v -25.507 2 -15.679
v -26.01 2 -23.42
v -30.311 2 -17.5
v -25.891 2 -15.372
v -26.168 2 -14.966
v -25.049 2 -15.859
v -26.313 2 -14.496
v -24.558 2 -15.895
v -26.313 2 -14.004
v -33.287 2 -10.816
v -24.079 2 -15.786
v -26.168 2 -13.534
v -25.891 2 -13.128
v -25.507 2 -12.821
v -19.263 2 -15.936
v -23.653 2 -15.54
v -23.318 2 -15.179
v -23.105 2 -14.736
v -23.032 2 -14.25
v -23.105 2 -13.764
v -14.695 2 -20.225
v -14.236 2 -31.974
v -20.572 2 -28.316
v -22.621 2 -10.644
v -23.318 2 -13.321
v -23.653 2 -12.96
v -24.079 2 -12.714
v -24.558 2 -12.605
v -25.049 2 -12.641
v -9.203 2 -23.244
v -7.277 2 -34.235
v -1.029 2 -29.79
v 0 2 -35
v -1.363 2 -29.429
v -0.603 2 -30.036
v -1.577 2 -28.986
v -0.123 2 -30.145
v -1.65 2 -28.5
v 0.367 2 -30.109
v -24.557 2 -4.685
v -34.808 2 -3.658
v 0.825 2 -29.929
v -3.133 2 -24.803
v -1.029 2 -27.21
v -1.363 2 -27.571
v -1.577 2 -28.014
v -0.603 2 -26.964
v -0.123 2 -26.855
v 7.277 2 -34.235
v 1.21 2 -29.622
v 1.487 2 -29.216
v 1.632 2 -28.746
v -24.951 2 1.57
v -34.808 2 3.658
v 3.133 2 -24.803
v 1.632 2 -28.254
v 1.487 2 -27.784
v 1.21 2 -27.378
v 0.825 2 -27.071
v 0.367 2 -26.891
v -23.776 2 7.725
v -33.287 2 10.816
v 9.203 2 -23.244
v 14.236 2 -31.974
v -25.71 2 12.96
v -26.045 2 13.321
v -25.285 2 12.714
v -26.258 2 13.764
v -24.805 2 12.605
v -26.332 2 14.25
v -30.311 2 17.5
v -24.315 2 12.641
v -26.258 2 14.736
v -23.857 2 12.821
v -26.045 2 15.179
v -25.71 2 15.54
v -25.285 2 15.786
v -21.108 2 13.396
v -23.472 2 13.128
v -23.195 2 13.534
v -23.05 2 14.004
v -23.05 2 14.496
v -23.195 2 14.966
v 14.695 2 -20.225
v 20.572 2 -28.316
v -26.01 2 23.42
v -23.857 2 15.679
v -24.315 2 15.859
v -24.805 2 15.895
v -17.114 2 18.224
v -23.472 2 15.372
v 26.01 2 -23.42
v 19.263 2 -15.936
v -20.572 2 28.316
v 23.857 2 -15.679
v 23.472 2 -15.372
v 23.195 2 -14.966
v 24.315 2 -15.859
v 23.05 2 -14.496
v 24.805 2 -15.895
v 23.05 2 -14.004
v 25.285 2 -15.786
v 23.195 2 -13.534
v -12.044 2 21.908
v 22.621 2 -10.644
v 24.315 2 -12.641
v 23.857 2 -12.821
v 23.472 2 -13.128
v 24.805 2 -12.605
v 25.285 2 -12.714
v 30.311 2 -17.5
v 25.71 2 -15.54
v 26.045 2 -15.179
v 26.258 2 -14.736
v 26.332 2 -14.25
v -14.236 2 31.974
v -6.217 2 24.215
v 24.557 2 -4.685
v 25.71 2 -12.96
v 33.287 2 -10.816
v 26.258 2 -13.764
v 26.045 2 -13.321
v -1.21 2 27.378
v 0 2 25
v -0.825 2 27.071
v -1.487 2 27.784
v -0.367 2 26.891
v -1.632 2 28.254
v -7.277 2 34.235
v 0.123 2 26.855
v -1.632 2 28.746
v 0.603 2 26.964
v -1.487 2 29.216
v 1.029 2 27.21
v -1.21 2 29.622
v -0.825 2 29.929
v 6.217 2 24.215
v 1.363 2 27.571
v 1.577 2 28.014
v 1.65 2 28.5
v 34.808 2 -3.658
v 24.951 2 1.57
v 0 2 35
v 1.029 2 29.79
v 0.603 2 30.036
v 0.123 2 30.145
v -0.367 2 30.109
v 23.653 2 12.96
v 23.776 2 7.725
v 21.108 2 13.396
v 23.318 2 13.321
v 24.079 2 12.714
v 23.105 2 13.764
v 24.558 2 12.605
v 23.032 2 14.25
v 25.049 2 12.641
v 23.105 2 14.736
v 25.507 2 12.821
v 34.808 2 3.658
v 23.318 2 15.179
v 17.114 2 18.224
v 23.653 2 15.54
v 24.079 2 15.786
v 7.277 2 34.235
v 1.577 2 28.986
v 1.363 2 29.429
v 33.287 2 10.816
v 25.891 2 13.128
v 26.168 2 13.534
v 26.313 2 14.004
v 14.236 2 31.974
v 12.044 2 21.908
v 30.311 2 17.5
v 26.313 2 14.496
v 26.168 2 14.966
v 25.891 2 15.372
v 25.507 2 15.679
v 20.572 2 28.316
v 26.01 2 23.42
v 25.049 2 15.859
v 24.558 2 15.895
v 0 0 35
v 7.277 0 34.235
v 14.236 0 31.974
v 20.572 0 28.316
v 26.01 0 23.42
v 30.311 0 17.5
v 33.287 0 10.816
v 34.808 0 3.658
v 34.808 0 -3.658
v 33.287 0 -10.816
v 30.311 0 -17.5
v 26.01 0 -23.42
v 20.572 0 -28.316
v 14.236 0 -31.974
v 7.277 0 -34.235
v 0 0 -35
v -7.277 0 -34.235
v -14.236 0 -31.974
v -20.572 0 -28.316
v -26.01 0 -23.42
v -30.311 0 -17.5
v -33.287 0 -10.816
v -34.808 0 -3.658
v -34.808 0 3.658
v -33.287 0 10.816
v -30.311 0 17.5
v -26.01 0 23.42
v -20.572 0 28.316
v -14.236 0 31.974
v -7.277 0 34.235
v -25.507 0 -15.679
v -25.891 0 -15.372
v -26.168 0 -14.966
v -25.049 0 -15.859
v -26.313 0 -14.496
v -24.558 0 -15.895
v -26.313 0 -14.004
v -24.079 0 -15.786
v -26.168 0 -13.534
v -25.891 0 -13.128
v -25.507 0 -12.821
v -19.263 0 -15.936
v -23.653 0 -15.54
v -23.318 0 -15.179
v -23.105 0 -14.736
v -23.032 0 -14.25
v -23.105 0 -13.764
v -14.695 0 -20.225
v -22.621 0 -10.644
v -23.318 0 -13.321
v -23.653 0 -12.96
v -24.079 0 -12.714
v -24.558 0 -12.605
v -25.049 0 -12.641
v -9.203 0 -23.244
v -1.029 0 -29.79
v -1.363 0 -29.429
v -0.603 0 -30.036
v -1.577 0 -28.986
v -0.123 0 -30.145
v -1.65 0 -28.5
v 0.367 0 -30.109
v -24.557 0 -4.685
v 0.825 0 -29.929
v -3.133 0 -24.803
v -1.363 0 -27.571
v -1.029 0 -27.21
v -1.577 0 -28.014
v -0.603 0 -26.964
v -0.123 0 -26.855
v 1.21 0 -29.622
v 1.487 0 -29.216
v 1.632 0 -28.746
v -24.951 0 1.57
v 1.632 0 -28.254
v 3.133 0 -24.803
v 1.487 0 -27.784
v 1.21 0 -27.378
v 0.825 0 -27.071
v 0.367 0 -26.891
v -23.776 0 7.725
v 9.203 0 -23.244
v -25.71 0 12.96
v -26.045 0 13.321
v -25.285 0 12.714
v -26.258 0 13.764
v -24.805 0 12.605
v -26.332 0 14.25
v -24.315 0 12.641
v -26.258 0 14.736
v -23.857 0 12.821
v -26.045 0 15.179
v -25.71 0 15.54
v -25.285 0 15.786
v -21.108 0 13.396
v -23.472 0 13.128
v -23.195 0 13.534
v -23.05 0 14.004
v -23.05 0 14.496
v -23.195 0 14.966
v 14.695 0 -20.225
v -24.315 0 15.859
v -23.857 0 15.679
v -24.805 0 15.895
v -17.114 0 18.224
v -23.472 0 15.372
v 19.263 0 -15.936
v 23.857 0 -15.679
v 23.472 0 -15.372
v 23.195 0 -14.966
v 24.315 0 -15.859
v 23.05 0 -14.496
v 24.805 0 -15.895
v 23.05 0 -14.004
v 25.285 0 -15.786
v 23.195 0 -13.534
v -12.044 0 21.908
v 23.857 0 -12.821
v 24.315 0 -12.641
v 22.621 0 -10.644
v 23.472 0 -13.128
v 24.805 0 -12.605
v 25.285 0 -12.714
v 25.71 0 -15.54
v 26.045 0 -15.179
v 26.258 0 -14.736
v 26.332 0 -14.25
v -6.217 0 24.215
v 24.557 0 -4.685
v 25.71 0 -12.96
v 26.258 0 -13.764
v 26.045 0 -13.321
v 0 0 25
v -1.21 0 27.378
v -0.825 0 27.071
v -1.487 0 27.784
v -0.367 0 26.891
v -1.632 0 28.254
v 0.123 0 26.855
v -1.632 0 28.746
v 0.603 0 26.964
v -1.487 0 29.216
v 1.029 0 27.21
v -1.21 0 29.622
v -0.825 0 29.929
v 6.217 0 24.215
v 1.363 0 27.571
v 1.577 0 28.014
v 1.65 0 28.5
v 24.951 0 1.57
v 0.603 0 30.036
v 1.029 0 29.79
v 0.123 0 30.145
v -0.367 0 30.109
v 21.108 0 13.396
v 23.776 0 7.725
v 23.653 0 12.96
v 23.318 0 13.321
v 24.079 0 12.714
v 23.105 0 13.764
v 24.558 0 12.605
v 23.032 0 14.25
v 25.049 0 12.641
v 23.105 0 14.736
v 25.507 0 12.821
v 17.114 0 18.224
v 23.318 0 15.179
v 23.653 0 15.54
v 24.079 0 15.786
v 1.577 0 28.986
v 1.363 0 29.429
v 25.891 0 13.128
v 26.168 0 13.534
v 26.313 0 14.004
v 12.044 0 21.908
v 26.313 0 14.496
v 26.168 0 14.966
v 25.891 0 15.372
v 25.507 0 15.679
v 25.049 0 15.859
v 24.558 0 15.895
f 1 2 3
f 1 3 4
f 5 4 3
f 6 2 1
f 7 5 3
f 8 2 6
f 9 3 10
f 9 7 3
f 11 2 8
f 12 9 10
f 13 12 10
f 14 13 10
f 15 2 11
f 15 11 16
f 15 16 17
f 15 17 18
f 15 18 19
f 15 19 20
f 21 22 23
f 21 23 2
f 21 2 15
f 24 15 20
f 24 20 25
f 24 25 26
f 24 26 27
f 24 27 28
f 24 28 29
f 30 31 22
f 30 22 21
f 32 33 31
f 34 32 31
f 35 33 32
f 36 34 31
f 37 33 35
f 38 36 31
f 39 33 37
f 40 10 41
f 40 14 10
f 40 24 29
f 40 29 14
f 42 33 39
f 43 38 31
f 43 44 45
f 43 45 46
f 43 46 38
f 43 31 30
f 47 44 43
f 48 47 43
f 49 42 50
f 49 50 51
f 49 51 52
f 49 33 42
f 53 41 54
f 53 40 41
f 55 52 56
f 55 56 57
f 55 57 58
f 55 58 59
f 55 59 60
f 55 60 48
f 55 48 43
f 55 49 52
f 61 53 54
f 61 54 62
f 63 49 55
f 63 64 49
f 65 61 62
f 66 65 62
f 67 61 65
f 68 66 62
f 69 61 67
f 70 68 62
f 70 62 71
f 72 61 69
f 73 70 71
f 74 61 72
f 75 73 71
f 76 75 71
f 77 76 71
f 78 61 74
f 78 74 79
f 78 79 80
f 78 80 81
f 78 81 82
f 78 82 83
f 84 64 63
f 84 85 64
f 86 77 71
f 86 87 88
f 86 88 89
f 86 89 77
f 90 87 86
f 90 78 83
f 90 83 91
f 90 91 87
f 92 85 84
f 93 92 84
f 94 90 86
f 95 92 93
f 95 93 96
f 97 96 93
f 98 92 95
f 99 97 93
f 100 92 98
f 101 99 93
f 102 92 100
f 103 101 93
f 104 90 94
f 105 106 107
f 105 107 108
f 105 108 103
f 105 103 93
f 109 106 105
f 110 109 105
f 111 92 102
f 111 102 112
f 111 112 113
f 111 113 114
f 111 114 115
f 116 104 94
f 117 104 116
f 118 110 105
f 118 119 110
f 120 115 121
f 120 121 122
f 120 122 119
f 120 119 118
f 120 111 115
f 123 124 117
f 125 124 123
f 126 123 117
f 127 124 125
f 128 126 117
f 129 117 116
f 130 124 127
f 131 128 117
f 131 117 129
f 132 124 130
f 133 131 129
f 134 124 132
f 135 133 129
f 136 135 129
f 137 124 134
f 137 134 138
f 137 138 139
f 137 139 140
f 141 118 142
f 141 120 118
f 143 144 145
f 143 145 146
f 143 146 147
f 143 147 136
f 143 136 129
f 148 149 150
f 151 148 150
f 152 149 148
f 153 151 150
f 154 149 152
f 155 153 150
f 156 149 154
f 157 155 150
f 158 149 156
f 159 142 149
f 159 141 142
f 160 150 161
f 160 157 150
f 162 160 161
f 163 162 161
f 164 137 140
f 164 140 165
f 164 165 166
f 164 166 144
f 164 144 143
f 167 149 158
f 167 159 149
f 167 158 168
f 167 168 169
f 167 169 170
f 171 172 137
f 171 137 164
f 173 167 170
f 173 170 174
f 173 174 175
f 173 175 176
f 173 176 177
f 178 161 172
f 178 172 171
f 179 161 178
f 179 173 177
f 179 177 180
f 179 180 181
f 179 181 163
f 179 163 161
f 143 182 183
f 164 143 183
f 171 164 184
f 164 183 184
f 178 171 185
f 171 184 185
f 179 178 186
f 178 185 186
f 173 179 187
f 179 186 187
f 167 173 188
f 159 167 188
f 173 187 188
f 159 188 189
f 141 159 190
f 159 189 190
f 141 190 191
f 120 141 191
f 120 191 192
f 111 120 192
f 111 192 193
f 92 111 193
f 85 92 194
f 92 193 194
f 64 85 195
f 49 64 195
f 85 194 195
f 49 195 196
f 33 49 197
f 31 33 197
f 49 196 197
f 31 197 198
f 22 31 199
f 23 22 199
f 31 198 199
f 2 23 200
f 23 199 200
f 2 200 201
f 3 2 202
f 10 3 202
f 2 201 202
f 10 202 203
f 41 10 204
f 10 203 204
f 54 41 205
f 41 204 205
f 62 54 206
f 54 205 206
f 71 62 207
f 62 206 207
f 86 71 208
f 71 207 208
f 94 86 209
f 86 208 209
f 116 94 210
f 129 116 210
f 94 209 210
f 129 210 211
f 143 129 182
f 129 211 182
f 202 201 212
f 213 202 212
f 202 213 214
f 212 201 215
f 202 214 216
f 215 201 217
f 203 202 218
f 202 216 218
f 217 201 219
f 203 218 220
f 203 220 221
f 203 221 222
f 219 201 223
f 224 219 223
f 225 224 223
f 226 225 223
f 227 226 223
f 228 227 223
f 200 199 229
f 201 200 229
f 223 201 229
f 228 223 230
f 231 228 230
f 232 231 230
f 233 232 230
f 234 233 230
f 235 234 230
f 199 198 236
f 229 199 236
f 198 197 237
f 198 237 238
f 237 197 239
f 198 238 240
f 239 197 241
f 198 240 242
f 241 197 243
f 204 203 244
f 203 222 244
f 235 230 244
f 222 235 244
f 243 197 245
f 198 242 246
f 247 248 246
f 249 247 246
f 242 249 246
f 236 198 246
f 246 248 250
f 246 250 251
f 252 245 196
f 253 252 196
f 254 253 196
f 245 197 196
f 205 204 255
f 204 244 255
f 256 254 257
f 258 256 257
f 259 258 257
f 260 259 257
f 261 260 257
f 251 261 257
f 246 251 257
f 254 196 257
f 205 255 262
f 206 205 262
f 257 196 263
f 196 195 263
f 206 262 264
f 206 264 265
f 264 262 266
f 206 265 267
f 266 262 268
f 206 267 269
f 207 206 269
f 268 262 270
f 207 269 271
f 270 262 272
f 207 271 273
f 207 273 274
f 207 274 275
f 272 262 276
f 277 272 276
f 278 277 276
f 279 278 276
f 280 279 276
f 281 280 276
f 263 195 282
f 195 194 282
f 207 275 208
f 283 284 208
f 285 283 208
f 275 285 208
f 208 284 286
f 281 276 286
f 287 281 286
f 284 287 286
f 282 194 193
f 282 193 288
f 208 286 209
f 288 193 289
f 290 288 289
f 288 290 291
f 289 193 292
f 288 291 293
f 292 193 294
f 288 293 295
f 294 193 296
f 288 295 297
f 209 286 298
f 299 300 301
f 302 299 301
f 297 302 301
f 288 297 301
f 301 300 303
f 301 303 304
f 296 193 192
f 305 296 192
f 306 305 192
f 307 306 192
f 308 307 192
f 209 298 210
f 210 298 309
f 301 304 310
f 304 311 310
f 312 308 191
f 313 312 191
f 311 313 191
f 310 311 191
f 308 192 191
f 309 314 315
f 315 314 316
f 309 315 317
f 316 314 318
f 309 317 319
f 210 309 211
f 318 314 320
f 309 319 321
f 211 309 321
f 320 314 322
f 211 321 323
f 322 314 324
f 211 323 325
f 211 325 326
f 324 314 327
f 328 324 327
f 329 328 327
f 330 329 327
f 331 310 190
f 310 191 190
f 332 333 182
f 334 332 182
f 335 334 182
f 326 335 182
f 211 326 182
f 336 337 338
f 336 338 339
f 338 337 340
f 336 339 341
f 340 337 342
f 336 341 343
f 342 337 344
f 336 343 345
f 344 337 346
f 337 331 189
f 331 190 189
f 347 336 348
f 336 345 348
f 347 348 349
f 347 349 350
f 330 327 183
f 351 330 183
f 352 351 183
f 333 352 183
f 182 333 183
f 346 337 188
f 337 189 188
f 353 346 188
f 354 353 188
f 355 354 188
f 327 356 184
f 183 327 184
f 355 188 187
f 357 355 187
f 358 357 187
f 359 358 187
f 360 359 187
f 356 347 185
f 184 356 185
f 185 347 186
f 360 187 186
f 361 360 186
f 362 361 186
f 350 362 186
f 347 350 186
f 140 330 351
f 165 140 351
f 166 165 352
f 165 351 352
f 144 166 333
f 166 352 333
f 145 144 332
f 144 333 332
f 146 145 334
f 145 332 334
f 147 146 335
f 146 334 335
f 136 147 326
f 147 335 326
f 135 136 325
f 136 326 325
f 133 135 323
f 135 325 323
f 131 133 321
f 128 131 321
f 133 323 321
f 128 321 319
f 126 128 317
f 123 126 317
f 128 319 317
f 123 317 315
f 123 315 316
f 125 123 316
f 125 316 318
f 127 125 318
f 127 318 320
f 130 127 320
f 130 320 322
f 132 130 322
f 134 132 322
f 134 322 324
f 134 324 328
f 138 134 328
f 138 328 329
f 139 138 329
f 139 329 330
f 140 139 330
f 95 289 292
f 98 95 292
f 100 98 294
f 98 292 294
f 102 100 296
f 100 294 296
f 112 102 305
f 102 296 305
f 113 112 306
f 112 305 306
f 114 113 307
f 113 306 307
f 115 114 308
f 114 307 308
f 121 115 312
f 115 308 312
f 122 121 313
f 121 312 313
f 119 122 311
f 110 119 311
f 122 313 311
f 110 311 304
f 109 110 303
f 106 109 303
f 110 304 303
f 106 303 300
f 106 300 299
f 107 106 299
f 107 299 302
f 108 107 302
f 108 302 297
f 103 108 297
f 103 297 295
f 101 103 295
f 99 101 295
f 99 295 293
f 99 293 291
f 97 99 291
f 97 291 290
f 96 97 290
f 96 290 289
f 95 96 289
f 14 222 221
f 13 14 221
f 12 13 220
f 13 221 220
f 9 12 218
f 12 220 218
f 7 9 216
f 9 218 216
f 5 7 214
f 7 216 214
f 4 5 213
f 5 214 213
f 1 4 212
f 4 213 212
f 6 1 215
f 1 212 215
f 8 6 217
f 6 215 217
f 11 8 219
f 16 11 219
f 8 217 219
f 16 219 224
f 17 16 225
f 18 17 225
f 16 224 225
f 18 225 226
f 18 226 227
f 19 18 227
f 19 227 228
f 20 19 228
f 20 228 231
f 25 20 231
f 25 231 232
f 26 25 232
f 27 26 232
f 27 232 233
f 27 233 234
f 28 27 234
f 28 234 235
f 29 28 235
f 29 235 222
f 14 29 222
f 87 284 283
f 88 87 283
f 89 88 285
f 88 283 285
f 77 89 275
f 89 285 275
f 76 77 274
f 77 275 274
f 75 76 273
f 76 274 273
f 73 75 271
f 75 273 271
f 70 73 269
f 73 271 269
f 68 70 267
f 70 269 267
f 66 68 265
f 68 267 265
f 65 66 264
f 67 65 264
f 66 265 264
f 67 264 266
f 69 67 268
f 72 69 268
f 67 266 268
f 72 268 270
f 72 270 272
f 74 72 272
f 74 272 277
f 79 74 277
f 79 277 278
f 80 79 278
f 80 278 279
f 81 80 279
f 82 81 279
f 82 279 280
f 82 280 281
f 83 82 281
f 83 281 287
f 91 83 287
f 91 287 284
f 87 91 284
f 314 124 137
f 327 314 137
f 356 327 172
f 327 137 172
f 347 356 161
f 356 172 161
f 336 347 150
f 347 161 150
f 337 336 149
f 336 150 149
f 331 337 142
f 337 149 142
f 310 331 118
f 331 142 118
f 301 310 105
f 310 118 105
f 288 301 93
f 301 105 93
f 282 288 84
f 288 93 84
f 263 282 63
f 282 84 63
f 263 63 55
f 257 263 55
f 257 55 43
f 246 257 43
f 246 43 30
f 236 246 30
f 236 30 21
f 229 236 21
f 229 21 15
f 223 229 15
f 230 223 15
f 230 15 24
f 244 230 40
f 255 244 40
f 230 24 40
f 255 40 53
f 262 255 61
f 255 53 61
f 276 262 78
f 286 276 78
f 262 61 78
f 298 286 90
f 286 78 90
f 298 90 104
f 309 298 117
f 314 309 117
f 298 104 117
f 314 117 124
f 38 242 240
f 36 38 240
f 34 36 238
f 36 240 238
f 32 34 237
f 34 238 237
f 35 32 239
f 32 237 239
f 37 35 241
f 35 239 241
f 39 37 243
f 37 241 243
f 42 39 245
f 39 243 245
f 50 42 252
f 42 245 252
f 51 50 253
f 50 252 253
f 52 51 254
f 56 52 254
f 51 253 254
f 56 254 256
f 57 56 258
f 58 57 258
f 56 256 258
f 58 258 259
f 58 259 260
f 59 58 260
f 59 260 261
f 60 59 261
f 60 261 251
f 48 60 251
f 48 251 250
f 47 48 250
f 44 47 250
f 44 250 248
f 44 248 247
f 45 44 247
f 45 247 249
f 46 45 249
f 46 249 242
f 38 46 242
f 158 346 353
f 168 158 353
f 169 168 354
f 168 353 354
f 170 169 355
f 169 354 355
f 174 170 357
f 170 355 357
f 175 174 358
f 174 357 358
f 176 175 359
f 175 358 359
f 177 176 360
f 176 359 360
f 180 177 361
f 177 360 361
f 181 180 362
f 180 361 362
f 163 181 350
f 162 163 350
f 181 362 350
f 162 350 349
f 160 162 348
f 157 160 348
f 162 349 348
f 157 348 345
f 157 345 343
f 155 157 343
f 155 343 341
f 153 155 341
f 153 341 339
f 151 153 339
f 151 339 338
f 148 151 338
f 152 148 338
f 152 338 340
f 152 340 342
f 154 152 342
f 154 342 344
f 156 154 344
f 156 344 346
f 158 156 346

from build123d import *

# Parameters (mm, degrees)
SKETCH_1_R               = 35
EXTRUDE_1_DEPTH          = 2
SKETCH_2_R               = 25
CUT_EXTRUDE_1_DEPTH      = 2
HOLE_WIZARD_1_D          = 3.3
PATTERN_CIRCULAR_1_COUNT = 6


with BuildPart() as part:
    # 草图1 → 凸台-拉伸1 (new body)
    with BuildSketch(Plane(origin=(0, 0, 0), x_dir=(1, 0, 0), z_dir=(0, 1, 0))):
        with Locations(Location((0, 0, 0), (0, 0, 270))):
            Circle(SKETCH_1_R)
    extrude(amount=EXTRUDE_1_DEPTH)

    # 草图2 → 切除-拉伸1 (cut)
    with BuildSketch(Plane(origin=(0, 2, 0), x_dir=(1, 0, 0), z_dir=(0, 1, 0))):
        with Locations(Location((0, 0, 0), (0, 0, 270))):
            Circle(SKETCH_2_R)
    extrude(amount=-CUT_EXTRUDE_1_DEPTH, mode=Mode.SUBTRACT)

    # 孔1 (through all)
    with Locations(Plane(origin=(0, 2, 0), x_dir=(1, 0, 0), z_dir=(0, 1, 0))):
        with Locations((0, 28.5)):
            hole_wizard_1 = Hole(HOLE_WIZARD_1_D / 2)

    # 阵列(圆周)1: 孔1 ×6 about axis
    pattern_circular_1_axis = Axis((0, 0, 0), (0, 1, 0))
    for i in range(1, PATTERN_CIRCULAR_1_COUNT):
        add(hole_wizard_1.rotate(pattern_circular_1_axis, i * 360 / PATTERN_CIRCULAR_1_COUNT), mode=Mode.SUBTRACT)


solid = part.part
